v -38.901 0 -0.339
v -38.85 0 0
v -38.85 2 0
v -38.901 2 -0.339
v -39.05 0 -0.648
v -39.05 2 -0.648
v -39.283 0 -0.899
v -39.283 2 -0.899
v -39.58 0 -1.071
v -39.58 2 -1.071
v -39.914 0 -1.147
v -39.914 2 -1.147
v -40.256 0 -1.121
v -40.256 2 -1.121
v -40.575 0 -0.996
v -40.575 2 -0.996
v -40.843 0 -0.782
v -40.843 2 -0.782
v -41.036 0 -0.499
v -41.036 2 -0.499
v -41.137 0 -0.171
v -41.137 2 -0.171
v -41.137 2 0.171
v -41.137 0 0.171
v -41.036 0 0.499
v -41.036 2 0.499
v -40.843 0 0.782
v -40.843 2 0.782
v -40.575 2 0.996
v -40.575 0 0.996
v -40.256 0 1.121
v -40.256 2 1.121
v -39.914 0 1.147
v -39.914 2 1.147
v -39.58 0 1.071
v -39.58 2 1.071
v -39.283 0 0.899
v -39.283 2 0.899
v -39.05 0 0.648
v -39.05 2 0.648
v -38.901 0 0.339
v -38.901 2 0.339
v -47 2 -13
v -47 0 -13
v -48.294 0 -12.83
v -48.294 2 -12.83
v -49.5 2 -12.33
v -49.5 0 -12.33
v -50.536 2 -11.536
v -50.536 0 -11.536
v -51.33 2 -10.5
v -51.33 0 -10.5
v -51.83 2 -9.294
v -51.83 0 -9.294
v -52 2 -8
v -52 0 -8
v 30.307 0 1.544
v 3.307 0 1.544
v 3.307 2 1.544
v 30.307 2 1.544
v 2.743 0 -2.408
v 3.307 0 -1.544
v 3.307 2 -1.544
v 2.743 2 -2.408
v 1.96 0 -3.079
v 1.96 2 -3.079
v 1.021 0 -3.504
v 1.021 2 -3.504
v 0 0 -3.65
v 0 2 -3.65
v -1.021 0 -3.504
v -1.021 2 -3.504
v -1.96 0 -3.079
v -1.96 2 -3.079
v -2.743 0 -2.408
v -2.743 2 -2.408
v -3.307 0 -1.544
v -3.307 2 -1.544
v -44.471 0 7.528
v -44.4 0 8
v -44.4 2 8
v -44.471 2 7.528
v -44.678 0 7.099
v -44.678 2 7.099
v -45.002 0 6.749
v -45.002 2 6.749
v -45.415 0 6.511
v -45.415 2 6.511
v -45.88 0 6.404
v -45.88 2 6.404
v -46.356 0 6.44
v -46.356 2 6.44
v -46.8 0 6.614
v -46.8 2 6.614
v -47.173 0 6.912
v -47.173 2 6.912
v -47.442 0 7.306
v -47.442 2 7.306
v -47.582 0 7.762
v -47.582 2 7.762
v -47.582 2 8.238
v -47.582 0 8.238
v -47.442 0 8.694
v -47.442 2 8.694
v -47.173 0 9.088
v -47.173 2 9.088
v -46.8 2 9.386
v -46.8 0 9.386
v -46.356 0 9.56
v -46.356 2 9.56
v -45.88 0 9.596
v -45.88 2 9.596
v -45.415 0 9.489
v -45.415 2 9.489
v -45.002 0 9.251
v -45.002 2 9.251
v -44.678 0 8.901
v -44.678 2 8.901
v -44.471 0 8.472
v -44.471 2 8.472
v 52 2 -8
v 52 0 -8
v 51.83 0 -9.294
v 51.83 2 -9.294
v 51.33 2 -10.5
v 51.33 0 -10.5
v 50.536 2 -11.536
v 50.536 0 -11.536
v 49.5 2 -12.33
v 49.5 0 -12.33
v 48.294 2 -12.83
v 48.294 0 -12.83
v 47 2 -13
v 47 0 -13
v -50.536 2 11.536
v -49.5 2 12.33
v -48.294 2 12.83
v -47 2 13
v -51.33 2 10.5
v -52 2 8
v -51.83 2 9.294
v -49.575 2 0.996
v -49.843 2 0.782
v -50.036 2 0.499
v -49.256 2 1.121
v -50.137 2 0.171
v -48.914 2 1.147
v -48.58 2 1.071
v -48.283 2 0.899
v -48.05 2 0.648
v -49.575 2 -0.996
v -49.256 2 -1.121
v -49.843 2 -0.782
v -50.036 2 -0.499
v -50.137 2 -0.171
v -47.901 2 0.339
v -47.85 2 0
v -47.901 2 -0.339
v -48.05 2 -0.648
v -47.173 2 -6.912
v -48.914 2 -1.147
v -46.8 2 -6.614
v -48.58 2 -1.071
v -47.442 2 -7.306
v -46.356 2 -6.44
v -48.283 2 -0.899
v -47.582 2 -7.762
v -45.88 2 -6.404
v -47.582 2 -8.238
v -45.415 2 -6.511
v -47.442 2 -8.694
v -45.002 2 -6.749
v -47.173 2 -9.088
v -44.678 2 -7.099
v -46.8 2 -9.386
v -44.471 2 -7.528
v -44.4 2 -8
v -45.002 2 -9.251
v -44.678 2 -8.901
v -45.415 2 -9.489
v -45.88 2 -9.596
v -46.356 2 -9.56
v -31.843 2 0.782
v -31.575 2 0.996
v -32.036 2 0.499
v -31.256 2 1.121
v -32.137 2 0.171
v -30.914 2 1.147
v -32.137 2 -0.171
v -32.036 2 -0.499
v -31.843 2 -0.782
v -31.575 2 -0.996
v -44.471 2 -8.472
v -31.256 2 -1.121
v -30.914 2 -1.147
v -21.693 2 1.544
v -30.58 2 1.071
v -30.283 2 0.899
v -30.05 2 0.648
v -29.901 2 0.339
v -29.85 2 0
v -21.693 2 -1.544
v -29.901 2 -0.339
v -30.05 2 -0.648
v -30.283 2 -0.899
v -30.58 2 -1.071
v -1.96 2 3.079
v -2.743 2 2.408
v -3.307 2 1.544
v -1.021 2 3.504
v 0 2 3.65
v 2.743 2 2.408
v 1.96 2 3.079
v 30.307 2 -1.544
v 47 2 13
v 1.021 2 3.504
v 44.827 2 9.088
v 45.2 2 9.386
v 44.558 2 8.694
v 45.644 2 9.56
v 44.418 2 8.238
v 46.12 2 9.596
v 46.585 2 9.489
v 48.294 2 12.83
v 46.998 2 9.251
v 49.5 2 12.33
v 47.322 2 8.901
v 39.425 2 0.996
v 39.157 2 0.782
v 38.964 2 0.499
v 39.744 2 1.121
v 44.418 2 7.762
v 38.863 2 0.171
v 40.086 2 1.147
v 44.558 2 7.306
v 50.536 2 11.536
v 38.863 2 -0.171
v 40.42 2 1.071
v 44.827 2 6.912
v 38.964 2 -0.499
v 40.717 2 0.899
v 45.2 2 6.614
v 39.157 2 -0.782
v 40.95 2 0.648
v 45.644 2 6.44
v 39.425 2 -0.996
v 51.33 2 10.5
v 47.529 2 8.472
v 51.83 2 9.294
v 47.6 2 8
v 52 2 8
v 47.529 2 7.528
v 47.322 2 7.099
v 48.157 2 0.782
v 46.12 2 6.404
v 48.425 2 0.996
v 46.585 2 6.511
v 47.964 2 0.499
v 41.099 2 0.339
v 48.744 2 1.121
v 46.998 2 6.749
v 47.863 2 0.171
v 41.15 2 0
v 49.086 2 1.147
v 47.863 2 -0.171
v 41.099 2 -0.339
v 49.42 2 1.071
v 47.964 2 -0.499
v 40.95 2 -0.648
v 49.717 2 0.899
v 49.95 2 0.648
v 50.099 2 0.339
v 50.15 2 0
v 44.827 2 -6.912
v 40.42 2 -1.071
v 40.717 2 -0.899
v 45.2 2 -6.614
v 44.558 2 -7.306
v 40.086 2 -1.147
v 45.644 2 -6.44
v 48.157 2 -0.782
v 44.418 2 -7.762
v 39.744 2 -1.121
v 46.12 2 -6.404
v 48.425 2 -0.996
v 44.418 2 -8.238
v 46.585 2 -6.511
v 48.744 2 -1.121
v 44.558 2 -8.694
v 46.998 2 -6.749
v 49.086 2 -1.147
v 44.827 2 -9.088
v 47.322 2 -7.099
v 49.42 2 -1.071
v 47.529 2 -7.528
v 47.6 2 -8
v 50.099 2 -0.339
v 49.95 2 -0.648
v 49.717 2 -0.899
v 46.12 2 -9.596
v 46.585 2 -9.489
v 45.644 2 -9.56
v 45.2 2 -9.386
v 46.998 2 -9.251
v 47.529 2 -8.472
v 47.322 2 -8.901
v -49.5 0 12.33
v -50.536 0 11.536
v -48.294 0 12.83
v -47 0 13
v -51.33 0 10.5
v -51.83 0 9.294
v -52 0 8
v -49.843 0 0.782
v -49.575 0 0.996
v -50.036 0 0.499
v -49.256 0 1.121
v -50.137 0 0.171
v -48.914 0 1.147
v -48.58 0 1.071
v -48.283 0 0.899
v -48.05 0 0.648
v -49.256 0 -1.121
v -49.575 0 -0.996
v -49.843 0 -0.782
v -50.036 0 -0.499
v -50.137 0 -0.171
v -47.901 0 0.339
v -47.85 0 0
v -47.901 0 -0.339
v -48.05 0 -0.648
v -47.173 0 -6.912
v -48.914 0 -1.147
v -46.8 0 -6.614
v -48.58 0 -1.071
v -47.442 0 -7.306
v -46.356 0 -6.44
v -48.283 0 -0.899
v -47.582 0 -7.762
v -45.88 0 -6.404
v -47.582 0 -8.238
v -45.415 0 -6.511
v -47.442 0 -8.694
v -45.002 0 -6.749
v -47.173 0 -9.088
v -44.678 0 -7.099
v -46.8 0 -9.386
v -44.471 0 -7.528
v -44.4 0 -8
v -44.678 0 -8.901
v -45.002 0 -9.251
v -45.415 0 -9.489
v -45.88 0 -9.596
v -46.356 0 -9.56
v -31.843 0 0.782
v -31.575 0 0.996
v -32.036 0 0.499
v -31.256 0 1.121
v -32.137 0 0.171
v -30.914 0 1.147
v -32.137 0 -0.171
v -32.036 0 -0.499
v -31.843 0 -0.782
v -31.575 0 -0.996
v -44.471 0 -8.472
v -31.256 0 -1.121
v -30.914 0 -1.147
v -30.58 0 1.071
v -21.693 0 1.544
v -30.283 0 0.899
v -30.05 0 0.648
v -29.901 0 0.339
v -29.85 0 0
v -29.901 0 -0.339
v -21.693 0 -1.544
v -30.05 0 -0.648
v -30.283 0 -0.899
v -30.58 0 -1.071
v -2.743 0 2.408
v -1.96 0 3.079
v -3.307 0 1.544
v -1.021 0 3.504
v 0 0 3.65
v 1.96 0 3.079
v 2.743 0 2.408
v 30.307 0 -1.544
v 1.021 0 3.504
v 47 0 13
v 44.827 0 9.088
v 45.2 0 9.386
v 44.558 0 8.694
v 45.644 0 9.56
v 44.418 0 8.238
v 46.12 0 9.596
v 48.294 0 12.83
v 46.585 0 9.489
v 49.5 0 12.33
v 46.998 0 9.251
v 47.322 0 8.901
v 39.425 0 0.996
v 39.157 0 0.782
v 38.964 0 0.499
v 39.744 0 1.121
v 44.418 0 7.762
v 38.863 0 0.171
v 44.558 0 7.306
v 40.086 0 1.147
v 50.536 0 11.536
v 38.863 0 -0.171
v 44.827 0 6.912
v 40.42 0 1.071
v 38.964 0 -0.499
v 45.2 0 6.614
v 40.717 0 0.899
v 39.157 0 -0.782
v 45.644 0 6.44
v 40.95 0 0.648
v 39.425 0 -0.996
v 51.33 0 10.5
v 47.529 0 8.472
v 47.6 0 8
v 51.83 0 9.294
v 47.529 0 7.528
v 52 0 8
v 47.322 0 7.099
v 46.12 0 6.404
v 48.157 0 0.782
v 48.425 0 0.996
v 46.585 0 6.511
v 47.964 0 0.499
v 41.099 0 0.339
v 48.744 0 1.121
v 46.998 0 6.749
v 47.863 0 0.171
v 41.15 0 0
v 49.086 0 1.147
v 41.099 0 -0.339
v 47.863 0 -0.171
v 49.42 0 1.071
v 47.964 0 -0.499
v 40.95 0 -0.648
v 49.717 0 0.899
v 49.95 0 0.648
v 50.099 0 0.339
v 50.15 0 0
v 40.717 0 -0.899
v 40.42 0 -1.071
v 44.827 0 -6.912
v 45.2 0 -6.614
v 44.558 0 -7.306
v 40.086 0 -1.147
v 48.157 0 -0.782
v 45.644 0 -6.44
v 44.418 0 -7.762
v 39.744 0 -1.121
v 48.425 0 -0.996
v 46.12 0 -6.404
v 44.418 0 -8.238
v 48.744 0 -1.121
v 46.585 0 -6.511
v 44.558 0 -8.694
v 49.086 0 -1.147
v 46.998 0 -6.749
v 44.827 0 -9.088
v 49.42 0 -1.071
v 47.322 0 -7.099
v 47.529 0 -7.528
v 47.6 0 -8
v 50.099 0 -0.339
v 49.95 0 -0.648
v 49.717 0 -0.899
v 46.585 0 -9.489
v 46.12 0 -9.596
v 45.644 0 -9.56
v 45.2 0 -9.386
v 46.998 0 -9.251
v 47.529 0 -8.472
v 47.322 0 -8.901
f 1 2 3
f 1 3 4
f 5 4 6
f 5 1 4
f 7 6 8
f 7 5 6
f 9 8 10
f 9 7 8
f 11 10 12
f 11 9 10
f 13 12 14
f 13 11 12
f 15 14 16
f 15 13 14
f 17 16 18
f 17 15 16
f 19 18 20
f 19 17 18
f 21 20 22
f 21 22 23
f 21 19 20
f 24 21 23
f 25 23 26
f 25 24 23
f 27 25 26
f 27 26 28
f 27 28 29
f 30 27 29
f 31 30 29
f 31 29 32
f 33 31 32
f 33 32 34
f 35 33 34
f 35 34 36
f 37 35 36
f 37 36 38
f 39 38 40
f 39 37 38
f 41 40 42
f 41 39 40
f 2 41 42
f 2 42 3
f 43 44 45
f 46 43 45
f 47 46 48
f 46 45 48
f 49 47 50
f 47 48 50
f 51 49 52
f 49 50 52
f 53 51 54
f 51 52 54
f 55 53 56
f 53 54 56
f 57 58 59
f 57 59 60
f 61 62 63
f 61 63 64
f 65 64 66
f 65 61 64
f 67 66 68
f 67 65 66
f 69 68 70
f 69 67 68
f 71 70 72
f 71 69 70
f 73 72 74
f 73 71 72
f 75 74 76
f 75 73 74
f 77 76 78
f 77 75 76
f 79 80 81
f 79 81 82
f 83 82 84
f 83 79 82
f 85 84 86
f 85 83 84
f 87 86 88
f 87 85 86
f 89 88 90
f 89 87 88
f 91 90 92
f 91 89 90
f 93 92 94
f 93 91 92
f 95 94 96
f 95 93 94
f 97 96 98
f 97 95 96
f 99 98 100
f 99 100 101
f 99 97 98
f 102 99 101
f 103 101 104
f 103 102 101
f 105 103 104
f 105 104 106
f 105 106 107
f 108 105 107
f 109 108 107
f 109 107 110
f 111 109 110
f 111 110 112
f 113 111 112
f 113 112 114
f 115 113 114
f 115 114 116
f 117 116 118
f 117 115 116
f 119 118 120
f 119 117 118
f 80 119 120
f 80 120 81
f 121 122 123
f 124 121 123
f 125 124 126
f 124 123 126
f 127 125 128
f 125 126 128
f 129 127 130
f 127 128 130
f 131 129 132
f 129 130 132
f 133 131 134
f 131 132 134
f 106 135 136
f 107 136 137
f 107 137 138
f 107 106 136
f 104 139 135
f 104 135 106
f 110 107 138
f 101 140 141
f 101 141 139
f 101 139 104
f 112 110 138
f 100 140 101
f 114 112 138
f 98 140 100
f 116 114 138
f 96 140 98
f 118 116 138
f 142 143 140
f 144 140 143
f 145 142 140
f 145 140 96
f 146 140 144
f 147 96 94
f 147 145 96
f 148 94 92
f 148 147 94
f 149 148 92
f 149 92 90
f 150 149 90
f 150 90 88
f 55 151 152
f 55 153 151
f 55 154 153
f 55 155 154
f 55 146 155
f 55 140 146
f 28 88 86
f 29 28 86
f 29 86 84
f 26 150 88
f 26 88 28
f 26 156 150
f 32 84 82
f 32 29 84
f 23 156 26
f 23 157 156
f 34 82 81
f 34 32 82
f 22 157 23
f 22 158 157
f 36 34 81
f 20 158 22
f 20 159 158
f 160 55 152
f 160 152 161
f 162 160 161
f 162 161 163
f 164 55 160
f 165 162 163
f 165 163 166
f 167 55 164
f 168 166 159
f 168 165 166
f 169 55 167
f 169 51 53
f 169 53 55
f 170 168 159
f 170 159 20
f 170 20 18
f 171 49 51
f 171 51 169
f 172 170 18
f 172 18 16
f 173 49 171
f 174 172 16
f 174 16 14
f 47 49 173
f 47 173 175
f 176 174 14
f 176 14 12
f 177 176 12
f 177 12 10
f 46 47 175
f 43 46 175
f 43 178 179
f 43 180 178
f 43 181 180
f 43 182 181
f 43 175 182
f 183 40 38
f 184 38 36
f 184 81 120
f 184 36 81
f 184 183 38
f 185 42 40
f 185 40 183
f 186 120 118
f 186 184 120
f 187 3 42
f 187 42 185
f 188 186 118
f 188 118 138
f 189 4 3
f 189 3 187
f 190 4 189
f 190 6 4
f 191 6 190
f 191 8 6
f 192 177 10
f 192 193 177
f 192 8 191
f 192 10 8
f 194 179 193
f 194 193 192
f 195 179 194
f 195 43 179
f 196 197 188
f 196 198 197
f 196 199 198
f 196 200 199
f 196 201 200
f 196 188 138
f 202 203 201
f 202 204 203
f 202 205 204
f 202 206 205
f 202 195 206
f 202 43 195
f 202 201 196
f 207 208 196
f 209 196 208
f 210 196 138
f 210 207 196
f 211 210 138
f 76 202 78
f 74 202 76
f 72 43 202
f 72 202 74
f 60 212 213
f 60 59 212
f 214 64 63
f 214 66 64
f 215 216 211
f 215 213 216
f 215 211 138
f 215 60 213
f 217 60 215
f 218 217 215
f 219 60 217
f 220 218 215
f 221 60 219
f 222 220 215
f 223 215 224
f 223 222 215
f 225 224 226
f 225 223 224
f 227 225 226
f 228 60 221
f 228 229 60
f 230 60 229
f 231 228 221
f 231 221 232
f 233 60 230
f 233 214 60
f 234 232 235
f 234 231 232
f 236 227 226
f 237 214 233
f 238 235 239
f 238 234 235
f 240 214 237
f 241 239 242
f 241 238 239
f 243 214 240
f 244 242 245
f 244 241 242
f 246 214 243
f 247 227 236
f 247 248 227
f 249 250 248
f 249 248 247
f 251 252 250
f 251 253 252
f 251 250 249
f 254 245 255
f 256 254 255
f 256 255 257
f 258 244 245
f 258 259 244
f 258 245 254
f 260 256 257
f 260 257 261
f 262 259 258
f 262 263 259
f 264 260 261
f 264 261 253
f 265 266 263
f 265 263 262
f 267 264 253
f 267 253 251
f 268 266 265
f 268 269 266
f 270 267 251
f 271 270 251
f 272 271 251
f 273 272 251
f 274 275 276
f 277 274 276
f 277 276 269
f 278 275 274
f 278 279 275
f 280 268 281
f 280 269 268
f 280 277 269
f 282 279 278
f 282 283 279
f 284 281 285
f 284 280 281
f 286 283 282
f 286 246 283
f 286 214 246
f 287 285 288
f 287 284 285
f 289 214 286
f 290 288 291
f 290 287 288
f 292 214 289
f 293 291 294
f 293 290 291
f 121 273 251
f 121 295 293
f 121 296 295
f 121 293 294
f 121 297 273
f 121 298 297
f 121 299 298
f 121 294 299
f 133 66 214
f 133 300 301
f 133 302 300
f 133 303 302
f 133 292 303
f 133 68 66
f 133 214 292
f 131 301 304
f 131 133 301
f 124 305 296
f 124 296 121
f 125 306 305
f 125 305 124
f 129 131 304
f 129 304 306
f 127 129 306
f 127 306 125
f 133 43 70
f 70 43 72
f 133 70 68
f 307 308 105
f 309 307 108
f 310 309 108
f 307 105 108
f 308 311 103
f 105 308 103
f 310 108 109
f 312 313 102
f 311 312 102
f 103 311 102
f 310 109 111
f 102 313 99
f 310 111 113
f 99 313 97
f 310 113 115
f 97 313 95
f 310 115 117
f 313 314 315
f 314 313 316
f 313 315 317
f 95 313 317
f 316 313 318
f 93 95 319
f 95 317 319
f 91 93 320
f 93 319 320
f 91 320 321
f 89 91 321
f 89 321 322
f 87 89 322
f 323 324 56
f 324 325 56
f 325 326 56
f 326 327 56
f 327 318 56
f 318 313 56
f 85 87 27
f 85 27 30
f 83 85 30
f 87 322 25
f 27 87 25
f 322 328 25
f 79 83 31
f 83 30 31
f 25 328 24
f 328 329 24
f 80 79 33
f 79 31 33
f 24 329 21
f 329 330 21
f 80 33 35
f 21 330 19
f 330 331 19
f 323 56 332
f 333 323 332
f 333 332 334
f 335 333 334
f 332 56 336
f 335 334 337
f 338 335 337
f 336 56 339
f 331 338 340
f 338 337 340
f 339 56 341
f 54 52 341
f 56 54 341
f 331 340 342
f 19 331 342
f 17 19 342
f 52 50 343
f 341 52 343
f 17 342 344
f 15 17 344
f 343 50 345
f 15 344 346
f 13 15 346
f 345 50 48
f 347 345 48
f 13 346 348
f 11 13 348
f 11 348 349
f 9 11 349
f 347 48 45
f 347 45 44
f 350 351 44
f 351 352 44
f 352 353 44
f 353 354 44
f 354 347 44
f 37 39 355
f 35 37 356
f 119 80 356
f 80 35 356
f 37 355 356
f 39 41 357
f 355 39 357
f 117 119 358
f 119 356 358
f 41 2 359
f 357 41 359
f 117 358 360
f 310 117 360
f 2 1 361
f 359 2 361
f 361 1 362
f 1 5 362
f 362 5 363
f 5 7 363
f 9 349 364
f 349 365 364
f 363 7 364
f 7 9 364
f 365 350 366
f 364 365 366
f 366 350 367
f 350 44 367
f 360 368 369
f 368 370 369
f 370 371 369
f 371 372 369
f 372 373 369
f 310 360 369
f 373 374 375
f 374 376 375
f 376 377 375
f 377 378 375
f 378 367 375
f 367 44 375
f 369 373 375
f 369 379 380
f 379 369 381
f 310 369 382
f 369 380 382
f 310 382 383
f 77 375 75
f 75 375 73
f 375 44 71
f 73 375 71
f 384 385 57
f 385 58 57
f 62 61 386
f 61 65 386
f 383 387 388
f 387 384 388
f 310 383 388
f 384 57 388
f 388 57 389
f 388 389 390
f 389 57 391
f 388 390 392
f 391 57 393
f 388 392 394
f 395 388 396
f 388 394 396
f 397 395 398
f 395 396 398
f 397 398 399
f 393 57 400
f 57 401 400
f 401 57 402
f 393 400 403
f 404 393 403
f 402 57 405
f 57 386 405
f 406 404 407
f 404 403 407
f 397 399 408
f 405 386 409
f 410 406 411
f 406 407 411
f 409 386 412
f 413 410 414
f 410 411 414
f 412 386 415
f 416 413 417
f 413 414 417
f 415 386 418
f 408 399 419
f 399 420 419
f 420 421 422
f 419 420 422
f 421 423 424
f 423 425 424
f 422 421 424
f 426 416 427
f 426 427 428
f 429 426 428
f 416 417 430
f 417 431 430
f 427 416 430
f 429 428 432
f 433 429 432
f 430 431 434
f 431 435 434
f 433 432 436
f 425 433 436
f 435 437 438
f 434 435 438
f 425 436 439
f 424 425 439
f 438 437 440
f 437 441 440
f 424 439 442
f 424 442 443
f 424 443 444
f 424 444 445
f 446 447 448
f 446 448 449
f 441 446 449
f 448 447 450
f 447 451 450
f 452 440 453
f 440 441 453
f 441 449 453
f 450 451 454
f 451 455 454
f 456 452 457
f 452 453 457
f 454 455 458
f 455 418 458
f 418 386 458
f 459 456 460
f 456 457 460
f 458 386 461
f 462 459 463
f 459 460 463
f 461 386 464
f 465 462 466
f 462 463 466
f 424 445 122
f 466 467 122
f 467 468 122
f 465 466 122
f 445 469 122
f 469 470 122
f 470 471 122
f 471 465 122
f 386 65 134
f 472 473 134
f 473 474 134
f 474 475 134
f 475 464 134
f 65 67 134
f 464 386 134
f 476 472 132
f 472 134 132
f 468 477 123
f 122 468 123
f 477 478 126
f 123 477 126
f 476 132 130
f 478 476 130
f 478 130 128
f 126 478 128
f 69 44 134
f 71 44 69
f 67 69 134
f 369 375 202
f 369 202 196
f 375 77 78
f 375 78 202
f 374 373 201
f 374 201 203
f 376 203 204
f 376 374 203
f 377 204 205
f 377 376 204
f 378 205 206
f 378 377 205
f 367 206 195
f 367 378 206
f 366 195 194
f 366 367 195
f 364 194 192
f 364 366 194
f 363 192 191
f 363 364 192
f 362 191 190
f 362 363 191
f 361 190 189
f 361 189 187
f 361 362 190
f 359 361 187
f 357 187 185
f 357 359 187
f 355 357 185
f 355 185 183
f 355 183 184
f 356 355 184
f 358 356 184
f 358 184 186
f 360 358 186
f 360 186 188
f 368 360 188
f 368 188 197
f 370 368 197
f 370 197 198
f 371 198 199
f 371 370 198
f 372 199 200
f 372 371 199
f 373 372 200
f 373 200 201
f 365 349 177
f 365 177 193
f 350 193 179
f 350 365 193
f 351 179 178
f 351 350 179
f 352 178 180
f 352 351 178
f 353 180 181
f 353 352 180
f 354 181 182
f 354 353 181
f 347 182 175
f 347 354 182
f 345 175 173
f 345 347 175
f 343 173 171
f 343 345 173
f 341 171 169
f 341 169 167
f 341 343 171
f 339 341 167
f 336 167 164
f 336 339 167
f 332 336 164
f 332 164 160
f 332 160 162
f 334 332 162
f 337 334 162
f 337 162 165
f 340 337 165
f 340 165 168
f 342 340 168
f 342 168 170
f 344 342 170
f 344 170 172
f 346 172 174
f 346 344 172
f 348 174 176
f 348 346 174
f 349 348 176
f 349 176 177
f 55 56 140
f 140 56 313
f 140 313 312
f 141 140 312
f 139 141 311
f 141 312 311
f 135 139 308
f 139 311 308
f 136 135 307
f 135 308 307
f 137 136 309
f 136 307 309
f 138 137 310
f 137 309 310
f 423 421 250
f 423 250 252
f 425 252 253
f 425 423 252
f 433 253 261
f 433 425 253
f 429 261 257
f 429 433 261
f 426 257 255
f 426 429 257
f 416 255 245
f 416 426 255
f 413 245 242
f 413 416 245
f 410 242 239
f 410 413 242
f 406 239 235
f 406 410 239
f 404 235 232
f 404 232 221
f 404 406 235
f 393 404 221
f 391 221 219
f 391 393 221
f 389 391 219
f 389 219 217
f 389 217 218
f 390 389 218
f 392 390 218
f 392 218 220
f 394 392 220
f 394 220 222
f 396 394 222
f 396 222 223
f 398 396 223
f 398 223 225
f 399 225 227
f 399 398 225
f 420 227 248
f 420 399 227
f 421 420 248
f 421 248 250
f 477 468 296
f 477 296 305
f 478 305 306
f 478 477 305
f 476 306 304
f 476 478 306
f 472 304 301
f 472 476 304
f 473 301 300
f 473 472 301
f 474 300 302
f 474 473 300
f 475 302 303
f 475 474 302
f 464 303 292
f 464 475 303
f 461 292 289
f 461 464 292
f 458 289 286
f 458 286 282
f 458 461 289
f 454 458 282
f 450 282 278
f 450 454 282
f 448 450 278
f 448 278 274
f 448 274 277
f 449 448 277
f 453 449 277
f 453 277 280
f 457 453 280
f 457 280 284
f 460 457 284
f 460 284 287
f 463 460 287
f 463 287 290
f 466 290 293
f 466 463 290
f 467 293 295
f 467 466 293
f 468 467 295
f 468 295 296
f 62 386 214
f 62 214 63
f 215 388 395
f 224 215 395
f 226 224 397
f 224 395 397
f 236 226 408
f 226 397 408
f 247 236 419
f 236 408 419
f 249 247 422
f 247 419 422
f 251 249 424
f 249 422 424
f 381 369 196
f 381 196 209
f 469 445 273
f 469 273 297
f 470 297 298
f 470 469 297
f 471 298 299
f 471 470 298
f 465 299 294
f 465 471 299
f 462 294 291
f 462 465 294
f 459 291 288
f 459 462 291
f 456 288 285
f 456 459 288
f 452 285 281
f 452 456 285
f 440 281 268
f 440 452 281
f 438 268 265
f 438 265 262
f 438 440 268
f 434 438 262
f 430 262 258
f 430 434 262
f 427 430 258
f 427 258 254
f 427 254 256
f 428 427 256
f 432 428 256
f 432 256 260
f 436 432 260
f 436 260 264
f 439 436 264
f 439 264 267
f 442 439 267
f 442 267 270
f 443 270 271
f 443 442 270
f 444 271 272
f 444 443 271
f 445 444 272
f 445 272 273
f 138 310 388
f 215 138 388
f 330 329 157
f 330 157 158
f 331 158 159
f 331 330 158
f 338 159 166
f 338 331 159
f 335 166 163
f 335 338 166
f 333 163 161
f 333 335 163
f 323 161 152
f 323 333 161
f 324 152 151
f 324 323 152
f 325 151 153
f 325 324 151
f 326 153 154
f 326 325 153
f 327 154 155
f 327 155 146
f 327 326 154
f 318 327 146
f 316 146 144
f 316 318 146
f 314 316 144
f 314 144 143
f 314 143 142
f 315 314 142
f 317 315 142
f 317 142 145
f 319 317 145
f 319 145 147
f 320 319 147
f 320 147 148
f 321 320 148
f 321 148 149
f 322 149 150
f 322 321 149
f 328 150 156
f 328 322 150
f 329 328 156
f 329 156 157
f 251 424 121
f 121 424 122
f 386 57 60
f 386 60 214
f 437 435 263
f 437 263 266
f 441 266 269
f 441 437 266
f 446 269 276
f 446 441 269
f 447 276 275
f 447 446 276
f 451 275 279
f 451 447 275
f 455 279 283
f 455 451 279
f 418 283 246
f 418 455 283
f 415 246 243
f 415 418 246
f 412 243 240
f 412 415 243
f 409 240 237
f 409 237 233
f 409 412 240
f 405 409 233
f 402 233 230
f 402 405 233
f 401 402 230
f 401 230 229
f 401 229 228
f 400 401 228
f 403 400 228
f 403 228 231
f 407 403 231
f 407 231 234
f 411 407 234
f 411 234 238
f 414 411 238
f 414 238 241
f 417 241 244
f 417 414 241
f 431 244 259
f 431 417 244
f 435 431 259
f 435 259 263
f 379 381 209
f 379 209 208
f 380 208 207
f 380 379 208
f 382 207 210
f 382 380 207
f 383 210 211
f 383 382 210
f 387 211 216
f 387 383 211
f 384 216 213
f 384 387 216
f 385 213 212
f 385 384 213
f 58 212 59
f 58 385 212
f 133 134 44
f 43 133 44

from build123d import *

# Parameters (mm, degrees)
ESBO_O1_R                = 1.6
ESBO_O1_R_2              = 1.15
RESSALTO_EXTRUS_O1_DEPTH = 2


with BuildPart() as part:
    # Esboço1 → Ressalto-extrusão1 (new body)
    with BuildSketch(Plane(origin=(0, 0, 0), x_dir=(1, 0, 0), z_dir=(0, 1, 0))):
        with BuildLine():
            Line((-47, -13), (47, -13))
            ThreePointArc((47, -13), (50.535533906, -11.535533906), (52, -8))
            Line((52, -8), (52, 8))
            ThreePointArc((52, 8), (50.535533906, 11.535533906), (47, 13))
            Line((47, 13), (-47, 13))
            ThreePointArc((-47, 13), (-50.535533906, 11.535533906), (-52, 8))
            Line((-52, 8), (-52, -8))
            ThreePointArc((-52, -8), (-50.535533906, -11.535533906), (-47, -13))
        make_face()
        with Locations((46, 8)):
            Circle(ESBO_O1_R, mode=Mode.SUBTRACT)
        with Locations((46, -8)):
            Circle(ESBO_O1_R, mode=Mode.SUBTRACT)
        with Locations((49, 0)):
            Circle(ESBO_O1_R_2, mode=Mode.SUBTRACT)
        with Locations((40, 0)):
            Circle(ESBO_O1_R_2, mode=Mode.SUBTRACT)
        with Locations((-46, 8)):
            Circle(ESBO_O1_R, mode=Mode.SUBTRACT)
        with Locations((-46, -8)):
            Circle(ESBO_O1_R, mode=Mode.SUBTRACT)
        with Locations((-40, 0)):
            Circle(ESBO_O1_R_2, mode=Mode.SUBTRACT)
        with Locations((-49, 0)):
            Circle(ESBO_O1_R_2, mode=Mode.SUBTRACT)
        with Locations((-31, 0)):
            Circle(ESBO_O1_R_2, mode=Mode.SUBTRACT)
        with BuildLine():
            Line((3.307143995, -1.544441193), (30.307143995, -1.544441193))
            Line((30.307143995, -1.544441193), (30.307143995, 1.544441193))
            Line((30.307143995, 1.544441193), (3.307143995, 1.544441193))
            ThreePointArc((3.307143995, 1.544441193), (0, 3.65), (-3.307143995, 1.544441193))
            Line((-3.307143995, 1.544441193), (-21.692856005, 1.544441193))
            Line((-21.692856005, 1.544441193), (-21.692856005, -1.544441193))
            Line((-21.692856005, -1.544441193), (-3.307143995, -1.544441193))
            ThreePointArc((-3.307143995, -1.544441193), (0, -3.65), (3.307143995, -1.544441193))
        make_face(mode=Mode.SUBTRACT)
    extrude(amount=RESSALTO_EXTRUS_O1_DEPTH)


solid = part.part
